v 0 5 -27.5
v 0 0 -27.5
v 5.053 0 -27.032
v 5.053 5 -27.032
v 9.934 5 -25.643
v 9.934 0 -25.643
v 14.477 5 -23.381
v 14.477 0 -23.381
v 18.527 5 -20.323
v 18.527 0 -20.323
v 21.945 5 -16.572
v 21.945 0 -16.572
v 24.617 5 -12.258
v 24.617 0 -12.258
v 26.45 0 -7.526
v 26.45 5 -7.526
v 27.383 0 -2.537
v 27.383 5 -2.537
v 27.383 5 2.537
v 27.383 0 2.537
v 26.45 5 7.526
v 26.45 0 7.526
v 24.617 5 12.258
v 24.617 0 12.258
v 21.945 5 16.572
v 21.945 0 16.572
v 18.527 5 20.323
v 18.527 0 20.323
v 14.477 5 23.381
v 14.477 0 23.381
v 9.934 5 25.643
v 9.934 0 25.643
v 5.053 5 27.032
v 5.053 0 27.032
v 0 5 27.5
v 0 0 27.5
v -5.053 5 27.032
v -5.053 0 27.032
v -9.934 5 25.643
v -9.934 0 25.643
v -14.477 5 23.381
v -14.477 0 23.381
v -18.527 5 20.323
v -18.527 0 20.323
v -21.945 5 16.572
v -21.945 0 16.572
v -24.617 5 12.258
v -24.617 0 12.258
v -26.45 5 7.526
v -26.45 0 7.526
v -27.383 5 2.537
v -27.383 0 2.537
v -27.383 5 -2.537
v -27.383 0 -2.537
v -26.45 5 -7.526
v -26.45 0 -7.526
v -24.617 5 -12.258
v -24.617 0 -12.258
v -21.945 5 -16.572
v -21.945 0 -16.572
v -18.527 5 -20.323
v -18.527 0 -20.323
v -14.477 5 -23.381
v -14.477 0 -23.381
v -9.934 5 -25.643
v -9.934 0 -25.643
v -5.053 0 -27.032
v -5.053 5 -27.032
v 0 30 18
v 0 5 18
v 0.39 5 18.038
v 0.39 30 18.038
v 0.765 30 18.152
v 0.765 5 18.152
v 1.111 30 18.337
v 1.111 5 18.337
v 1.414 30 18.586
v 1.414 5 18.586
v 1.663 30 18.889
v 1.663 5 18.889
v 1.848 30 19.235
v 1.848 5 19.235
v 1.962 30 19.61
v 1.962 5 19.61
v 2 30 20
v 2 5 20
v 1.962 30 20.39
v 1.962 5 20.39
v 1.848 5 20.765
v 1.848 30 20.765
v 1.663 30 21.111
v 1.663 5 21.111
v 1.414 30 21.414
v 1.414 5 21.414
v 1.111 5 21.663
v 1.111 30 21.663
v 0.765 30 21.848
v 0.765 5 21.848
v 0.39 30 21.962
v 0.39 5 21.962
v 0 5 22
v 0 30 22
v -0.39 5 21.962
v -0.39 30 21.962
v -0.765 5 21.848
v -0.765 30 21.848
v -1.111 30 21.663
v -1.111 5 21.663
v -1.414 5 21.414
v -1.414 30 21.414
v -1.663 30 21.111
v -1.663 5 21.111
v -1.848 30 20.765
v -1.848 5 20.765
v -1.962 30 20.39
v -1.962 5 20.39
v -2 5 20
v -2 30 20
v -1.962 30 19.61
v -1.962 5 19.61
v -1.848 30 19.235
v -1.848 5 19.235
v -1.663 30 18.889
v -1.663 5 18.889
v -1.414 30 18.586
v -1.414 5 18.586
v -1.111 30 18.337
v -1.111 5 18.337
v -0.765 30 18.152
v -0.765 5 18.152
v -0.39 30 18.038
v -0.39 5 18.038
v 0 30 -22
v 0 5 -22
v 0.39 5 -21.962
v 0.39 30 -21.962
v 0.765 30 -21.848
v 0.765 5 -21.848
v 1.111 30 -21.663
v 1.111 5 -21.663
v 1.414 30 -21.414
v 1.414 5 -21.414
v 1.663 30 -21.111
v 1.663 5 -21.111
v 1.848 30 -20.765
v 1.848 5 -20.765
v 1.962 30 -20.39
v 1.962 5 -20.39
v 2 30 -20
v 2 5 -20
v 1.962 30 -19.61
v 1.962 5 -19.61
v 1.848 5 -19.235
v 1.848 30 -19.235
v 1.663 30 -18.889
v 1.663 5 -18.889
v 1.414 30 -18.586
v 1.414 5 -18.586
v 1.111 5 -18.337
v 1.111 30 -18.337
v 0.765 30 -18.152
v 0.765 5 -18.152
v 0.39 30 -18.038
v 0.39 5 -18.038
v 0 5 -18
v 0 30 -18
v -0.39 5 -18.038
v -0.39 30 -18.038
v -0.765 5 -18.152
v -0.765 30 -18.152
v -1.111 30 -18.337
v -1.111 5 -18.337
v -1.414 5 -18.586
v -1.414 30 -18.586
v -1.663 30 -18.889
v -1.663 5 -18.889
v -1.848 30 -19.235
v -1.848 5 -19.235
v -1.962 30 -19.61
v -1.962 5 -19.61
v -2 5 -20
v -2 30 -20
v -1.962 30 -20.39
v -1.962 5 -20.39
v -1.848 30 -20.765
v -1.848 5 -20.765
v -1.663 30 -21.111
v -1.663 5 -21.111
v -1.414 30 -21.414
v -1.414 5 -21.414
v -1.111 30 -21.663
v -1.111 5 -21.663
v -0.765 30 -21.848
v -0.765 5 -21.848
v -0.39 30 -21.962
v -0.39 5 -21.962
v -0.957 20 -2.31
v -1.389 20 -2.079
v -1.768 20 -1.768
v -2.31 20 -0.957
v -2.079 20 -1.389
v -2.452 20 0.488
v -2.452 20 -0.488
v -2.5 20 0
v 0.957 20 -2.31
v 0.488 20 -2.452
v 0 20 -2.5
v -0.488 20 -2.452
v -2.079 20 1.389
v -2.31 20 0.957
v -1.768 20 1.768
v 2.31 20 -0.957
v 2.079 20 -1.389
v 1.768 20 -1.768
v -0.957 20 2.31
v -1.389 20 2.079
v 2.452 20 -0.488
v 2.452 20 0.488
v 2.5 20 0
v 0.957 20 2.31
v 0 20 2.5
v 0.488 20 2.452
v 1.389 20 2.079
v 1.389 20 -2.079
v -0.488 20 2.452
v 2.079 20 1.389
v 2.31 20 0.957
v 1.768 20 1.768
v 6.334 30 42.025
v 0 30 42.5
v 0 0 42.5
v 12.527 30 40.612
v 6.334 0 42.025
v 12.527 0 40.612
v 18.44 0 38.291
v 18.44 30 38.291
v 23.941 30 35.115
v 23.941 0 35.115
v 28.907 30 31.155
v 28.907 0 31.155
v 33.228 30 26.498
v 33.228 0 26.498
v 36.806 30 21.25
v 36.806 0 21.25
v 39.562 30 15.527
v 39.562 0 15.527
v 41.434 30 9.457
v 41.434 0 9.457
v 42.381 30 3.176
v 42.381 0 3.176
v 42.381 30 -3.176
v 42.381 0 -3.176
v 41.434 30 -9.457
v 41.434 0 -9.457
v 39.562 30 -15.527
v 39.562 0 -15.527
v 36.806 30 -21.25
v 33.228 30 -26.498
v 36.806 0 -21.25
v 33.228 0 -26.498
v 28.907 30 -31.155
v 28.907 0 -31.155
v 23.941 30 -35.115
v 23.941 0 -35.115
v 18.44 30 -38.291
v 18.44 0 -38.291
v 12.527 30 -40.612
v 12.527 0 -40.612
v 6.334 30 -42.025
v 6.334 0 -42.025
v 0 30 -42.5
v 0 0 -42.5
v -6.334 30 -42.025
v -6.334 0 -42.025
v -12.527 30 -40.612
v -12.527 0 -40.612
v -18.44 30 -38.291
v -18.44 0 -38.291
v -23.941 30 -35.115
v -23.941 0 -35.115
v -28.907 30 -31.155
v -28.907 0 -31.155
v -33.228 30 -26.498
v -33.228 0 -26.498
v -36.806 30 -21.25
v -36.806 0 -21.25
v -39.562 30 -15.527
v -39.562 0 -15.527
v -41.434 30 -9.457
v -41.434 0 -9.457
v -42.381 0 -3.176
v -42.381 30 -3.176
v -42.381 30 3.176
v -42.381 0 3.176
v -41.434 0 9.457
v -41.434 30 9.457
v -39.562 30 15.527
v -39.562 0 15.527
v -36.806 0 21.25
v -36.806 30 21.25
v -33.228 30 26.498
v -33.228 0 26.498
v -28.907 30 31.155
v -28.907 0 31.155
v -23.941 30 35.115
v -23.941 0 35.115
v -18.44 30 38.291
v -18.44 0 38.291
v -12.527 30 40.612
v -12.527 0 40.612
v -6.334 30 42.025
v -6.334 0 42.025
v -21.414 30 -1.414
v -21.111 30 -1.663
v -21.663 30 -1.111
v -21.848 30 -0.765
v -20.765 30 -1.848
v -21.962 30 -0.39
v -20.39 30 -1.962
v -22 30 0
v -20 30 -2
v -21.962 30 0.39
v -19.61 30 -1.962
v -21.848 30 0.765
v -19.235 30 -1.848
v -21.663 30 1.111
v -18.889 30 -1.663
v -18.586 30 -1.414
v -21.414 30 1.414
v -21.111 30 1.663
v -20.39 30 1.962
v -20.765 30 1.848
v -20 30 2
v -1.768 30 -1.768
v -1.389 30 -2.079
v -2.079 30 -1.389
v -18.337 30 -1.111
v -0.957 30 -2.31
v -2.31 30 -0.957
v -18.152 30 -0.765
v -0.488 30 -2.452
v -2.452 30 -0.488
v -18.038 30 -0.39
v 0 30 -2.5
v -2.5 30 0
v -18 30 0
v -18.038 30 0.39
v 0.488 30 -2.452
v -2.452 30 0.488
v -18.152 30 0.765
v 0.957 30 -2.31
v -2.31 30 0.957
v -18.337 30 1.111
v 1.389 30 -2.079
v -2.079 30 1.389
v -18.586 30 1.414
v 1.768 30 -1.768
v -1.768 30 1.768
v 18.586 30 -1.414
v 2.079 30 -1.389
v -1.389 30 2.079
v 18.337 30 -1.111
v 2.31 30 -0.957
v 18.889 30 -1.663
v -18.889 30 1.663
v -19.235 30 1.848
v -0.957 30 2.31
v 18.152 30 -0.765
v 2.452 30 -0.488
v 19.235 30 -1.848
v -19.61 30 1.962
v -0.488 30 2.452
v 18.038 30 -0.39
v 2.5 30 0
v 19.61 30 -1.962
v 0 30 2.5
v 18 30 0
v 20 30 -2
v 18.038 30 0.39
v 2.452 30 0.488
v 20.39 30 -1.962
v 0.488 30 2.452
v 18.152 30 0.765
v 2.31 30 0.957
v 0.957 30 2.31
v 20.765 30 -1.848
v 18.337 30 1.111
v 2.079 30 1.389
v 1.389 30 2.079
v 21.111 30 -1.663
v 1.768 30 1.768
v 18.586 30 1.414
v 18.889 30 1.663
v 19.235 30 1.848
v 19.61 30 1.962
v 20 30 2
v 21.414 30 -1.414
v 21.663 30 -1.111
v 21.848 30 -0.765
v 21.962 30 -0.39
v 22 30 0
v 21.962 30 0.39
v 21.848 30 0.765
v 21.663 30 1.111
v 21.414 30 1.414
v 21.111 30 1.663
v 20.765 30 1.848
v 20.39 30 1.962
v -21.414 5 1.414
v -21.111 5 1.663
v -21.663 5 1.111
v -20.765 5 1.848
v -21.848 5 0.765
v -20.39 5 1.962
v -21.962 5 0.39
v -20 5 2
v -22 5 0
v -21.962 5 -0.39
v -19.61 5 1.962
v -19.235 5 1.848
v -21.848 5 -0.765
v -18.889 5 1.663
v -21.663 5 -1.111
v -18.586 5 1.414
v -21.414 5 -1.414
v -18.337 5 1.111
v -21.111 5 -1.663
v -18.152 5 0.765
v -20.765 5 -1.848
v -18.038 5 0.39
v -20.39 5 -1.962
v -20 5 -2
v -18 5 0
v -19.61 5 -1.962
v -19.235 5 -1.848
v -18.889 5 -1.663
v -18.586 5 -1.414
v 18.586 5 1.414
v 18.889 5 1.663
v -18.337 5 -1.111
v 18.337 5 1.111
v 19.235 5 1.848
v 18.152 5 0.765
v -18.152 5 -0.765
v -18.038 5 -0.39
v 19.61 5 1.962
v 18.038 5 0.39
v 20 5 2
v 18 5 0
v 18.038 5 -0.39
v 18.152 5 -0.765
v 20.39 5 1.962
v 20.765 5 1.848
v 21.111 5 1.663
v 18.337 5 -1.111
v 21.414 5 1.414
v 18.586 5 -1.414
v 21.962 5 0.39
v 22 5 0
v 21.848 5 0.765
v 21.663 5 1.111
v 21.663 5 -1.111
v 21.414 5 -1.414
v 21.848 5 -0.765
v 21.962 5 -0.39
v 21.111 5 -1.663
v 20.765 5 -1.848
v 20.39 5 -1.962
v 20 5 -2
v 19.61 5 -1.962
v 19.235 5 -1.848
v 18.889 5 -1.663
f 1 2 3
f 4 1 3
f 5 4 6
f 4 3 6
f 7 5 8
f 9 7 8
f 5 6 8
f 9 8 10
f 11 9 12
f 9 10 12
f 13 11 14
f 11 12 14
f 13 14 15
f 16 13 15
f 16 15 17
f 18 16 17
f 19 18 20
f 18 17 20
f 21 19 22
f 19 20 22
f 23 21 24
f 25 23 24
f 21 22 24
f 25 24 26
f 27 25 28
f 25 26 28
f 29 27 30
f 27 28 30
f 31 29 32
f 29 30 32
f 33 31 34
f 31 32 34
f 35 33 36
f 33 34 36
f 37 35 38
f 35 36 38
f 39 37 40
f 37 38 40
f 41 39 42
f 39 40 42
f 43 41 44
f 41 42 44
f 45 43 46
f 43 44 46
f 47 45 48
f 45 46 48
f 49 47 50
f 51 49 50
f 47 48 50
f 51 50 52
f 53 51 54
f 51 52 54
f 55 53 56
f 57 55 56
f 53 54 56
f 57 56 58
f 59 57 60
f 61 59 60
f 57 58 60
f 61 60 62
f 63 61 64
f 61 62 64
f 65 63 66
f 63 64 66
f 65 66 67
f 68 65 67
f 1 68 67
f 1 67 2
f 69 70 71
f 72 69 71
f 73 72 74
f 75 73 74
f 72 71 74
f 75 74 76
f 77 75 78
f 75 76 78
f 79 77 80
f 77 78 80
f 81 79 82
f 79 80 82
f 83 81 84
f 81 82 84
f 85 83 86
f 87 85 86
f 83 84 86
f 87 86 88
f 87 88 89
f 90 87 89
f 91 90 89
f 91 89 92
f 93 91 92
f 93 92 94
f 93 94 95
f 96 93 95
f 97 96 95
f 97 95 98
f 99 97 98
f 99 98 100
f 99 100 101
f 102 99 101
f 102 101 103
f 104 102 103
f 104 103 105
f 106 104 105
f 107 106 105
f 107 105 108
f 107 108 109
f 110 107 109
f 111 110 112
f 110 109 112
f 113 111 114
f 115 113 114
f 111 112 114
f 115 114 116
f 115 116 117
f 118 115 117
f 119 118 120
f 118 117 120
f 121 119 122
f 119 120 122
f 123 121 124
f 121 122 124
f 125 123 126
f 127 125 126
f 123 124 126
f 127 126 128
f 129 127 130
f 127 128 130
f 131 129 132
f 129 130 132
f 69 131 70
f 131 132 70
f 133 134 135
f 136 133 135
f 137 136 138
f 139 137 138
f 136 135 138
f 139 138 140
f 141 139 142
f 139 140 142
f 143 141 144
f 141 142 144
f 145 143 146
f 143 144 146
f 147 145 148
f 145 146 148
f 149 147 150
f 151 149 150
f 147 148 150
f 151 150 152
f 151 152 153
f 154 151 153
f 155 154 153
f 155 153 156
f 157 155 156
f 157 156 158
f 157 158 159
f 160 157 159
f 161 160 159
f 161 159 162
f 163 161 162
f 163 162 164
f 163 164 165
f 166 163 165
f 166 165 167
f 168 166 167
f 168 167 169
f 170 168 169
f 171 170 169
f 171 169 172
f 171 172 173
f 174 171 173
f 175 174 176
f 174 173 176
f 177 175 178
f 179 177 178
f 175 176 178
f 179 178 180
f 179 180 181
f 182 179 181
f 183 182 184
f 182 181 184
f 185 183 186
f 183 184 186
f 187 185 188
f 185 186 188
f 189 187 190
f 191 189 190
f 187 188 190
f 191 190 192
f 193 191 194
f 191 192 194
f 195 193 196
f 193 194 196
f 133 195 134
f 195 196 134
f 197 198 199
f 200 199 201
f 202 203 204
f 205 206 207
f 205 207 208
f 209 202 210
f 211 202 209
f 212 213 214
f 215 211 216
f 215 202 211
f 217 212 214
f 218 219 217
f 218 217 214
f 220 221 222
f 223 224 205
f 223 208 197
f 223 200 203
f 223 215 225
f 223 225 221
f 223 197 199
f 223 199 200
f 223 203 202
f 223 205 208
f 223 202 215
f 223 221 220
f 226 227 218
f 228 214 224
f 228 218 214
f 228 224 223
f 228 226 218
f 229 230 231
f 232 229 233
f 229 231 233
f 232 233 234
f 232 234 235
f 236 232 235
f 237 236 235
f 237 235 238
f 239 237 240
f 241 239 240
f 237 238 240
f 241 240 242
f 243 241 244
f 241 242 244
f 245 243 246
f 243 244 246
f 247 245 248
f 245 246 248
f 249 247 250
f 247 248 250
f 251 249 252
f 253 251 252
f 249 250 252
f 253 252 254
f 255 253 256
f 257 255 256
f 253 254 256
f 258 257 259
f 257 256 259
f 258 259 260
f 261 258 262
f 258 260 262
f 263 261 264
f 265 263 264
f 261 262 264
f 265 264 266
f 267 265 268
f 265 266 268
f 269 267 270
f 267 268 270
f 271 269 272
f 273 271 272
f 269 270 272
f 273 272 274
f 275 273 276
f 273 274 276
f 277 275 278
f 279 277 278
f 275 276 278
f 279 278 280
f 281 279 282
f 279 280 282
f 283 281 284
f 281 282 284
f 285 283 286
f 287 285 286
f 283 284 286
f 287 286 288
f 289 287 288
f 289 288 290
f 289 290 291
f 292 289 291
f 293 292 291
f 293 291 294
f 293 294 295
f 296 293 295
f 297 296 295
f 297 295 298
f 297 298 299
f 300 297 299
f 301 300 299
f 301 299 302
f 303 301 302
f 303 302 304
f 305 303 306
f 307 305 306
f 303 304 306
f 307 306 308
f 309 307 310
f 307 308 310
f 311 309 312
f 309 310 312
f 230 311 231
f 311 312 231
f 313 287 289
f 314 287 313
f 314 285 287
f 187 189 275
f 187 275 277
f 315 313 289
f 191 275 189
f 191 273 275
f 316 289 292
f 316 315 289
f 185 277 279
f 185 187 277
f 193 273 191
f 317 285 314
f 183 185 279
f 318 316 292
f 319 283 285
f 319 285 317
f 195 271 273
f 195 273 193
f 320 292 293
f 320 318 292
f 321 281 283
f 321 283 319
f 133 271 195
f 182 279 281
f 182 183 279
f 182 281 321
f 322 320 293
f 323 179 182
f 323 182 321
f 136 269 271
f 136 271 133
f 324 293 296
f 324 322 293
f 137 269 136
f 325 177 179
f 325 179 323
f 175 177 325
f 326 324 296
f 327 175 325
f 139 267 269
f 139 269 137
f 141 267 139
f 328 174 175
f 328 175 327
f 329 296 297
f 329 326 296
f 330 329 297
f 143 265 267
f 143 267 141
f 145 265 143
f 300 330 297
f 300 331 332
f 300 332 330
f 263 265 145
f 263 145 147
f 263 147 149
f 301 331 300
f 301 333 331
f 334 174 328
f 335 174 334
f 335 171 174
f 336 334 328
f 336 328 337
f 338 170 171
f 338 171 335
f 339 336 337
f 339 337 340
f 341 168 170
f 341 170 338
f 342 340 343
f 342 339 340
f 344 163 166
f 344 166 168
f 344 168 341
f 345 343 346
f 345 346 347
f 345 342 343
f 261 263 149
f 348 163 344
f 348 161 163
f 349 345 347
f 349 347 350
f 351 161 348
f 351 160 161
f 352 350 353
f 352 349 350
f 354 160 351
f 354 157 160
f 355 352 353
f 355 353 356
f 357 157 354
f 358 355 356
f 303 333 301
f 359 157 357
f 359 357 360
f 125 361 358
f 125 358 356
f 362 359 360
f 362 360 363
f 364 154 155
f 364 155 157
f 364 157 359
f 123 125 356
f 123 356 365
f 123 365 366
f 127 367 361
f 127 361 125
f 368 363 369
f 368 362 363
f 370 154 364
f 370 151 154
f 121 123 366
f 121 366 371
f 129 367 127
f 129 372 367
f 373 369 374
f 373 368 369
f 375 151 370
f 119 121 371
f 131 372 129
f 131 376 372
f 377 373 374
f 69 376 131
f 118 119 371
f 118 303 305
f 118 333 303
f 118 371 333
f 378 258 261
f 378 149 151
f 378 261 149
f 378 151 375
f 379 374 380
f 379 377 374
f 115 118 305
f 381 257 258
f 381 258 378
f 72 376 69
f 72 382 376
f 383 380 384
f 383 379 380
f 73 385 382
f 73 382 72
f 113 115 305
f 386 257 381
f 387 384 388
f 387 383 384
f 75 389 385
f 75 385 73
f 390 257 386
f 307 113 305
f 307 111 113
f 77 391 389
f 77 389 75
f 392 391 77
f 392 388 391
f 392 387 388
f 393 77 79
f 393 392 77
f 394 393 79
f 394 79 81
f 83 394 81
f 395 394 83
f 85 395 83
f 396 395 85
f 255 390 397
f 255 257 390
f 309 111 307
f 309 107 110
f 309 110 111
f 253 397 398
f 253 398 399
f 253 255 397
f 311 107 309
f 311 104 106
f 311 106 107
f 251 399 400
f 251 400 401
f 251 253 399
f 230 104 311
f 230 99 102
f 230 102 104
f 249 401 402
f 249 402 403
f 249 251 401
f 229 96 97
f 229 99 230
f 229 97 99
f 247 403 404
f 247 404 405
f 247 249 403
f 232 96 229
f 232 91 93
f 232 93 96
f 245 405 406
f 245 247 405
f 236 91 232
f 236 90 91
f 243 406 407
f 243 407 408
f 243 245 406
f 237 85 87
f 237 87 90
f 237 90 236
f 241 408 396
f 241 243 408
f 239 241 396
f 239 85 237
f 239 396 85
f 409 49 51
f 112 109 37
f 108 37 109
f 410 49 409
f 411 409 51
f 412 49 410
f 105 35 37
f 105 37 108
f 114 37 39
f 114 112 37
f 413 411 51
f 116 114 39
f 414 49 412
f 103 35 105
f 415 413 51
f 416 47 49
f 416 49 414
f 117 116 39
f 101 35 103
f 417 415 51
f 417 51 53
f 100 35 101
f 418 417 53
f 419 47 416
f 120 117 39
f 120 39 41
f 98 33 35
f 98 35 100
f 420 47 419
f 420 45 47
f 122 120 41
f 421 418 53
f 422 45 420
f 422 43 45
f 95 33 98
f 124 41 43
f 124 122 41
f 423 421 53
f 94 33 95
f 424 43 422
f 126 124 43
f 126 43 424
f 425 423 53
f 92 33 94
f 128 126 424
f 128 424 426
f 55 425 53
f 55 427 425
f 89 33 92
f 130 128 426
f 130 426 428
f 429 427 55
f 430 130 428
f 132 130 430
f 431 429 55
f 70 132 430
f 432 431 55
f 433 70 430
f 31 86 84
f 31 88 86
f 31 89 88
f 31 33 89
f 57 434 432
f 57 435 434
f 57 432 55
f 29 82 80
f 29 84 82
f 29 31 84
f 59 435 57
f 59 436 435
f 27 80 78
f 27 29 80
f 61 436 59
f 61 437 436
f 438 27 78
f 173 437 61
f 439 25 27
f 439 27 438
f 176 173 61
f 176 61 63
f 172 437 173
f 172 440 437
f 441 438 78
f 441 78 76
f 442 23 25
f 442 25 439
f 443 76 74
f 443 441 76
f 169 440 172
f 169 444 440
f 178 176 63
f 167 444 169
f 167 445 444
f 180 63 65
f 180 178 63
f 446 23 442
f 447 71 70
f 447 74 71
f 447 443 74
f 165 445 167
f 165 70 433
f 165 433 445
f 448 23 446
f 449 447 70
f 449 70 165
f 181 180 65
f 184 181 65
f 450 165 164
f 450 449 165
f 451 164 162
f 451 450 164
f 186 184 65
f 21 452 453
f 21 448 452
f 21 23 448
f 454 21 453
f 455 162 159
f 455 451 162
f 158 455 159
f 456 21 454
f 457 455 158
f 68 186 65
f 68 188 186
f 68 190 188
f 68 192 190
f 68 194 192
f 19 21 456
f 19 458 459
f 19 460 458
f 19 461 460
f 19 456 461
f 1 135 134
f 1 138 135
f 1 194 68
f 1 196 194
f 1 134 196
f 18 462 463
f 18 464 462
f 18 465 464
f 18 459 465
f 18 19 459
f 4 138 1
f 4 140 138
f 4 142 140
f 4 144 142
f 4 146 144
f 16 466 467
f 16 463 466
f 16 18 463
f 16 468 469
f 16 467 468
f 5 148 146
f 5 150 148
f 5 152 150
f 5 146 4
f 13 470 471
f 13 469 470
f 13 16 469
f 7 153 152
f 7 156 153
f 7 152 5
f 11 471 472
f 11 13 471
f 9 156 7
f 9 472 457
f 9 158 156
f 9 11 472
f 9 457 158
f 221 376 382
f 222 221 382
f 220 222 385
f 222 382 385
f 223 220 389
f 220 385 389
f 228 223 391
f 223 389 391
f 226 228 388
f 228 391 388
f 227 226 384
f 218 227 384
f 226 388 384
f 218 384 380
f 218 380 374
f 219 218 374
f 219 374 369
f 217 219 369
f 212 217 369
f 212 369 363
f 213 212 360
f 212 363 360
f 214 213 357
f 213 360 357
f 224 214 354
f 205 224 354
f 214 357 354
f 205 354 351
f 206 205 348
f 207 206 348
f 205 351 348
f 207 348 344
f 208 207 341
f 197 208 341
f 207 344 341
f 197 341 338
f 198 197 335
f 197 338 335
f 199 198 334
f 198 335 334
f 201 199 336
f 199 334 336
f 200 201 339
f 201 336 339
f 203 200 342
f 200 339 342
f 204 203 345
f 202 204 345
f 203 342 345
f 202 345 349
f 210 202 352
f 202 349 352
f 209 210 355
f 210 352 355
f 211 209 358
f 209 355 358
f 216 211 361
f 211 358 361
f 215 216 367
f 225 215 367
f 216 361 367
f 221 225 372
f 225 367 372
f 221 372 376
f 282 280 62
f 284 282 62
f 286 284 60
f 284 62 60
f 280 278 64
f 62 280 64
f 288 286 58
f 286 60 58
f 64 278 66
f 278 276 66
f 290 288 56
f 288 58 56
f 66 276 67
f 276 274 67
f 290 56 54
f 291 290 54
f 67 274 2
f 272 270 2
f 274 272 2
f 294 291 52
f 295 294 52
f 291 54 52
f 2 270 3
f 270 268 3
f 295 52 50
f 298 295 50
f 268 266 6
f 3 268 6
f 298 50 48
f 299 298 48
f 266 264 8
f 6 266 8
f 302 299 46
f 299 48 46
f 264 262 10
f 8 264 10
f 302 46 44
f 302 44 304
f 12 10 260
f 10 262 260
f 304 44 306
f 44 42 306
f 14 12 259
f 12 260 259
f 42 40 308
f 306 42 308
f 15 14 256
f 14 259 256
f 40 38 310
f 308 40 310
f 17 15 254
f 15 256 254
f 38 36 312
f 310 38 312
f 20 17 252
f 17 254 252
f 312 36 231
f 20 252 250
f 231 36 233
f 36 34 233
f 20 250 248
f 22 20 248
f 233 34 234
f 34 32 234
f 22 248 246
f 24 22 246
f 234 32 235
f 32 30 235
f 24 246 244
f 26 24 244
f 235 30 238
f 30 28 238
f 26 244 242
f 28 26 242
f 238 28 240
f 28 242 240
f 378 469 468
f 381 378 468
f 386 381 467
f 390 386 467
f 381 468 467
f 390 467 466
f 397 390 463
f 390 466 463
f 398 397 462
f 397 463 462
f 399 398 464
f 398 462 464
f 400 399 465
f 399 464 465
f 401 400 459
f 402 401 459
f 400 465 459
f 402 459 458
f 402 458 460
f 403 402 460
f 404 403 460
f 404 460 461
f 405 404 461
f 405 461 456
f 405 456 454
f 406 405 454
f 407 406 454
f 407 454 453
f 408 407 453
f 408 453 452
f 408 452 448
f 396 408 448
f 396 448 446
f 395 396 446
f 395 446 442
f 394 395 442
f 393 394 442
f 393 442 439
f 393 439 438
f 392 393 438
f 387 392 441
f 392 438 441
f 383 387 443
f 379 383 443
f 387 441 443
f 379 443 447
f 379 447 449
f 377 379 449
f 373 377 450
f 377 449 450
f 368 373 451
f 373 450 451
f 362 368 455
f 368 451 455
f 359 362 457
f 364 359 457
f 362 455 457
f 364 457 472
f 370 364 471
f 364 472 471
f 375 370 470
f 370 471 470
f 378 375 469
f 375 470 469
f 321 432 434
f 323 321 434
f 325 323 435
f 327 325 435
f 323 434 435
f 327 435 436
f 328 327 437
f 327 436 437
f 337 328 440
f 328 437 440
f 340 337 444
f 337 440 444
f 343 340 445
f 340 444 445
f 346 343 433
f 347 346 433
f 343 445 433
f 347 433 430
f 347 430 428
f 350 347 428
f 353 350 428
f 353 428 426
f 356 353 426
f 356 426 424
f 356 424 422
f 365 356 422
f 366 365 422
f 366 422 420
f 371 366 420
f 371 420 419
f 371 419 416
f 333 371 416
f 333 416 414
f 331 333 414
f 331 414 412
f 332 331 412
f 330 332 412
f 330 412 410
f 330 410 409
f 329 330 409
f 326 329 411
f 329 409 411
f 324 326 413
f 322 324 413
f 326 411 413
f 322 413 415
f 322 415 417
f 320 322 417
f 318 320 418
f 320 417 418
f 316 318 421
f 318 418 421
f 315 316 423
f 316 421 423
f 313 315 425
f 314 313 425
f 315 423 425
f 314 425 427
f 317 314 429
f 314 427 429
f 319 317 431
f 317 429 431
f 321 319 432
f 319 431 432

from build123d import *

# Parameters (mm, degrees)
CROQUIS1_R              = 42.5
SALIENTE_EXTRUIR1_DEPTH = 30
CROQUIS2_R              = 2.5
CORTAR_EXTRUIR1_DEPTH   = 10
CROQUIS3_R              = 27.5
CORTAR_EXTRUIR2_DEPTH   = 5
CROQUIS4_R              = 2
CORTAR_EXTRUIR3_DEPTH   = 66.096082831


with BuildPart() as part:
    # Croquis1 → Saliente-Extruir1 (new body)
    with BuildSketch(Plane(origin=(0, 0, 0), x_dir=(1, 0, 0), z_dir=(0, 1, 0))):
        with Locations(Location((0, 0, 0), (0, 0, 270))):
            Circle(CROQUIS1_R)
    extrude(amount=SALIENTE_EXTRUIR1_DEPTH)

    # Croquis2 → Cortar-Extruir1 (cut)
    with BuildSketch(Plane(origin=(0, 30, 0), x_dir=(1, 0, 0), z_dir=(0, 1, 0))):
        with Locations(Location((0, 0, 0), (0, 0, 270))):
            Circle(CROQUIS2_R)
    extrude(amount=-CORTAR_EXTRUIR1_DEPTH, mode=Mode.SUBTRACT)

    # Croquis3 → Cortar-Extruir2 (cut)
    with BuildSketch(Plane.XZ):
        with Locations(Location((0, 0, 0), (0, 0, 270))):
            Circle(CROQUIS3_R)
    extrude(amount=-CORTAR_EXTRUIR2_DEPTH, mode=Mode.SUBTRACT)

    # Croquis4 → Cortar-Extruir3 (cut, through all)
    with BuildSketch(Plane.XZ.offset(-5)):
        with Locations(Location((0, 20, 0), (0, 0, 270))):
            Circle(CROQUIS4_R)
        with Locations(Location((-20, 0, 0), (0, 0, 270))):
            Circle(CROQUIS4_R)
        with Locations(Location((0, -20, 0), (0, 0, 270))):
            Circle(CROQUIS4_R)
        with Locations(Location((20, 0, 0), (0, 0, 270))):
            Circle(CROQUIS4_R)
    extrude(amount=-CORTAR_EXTRUIR3_DEPTH, mode=Mode.SUBTRACT)


solid = part.part
